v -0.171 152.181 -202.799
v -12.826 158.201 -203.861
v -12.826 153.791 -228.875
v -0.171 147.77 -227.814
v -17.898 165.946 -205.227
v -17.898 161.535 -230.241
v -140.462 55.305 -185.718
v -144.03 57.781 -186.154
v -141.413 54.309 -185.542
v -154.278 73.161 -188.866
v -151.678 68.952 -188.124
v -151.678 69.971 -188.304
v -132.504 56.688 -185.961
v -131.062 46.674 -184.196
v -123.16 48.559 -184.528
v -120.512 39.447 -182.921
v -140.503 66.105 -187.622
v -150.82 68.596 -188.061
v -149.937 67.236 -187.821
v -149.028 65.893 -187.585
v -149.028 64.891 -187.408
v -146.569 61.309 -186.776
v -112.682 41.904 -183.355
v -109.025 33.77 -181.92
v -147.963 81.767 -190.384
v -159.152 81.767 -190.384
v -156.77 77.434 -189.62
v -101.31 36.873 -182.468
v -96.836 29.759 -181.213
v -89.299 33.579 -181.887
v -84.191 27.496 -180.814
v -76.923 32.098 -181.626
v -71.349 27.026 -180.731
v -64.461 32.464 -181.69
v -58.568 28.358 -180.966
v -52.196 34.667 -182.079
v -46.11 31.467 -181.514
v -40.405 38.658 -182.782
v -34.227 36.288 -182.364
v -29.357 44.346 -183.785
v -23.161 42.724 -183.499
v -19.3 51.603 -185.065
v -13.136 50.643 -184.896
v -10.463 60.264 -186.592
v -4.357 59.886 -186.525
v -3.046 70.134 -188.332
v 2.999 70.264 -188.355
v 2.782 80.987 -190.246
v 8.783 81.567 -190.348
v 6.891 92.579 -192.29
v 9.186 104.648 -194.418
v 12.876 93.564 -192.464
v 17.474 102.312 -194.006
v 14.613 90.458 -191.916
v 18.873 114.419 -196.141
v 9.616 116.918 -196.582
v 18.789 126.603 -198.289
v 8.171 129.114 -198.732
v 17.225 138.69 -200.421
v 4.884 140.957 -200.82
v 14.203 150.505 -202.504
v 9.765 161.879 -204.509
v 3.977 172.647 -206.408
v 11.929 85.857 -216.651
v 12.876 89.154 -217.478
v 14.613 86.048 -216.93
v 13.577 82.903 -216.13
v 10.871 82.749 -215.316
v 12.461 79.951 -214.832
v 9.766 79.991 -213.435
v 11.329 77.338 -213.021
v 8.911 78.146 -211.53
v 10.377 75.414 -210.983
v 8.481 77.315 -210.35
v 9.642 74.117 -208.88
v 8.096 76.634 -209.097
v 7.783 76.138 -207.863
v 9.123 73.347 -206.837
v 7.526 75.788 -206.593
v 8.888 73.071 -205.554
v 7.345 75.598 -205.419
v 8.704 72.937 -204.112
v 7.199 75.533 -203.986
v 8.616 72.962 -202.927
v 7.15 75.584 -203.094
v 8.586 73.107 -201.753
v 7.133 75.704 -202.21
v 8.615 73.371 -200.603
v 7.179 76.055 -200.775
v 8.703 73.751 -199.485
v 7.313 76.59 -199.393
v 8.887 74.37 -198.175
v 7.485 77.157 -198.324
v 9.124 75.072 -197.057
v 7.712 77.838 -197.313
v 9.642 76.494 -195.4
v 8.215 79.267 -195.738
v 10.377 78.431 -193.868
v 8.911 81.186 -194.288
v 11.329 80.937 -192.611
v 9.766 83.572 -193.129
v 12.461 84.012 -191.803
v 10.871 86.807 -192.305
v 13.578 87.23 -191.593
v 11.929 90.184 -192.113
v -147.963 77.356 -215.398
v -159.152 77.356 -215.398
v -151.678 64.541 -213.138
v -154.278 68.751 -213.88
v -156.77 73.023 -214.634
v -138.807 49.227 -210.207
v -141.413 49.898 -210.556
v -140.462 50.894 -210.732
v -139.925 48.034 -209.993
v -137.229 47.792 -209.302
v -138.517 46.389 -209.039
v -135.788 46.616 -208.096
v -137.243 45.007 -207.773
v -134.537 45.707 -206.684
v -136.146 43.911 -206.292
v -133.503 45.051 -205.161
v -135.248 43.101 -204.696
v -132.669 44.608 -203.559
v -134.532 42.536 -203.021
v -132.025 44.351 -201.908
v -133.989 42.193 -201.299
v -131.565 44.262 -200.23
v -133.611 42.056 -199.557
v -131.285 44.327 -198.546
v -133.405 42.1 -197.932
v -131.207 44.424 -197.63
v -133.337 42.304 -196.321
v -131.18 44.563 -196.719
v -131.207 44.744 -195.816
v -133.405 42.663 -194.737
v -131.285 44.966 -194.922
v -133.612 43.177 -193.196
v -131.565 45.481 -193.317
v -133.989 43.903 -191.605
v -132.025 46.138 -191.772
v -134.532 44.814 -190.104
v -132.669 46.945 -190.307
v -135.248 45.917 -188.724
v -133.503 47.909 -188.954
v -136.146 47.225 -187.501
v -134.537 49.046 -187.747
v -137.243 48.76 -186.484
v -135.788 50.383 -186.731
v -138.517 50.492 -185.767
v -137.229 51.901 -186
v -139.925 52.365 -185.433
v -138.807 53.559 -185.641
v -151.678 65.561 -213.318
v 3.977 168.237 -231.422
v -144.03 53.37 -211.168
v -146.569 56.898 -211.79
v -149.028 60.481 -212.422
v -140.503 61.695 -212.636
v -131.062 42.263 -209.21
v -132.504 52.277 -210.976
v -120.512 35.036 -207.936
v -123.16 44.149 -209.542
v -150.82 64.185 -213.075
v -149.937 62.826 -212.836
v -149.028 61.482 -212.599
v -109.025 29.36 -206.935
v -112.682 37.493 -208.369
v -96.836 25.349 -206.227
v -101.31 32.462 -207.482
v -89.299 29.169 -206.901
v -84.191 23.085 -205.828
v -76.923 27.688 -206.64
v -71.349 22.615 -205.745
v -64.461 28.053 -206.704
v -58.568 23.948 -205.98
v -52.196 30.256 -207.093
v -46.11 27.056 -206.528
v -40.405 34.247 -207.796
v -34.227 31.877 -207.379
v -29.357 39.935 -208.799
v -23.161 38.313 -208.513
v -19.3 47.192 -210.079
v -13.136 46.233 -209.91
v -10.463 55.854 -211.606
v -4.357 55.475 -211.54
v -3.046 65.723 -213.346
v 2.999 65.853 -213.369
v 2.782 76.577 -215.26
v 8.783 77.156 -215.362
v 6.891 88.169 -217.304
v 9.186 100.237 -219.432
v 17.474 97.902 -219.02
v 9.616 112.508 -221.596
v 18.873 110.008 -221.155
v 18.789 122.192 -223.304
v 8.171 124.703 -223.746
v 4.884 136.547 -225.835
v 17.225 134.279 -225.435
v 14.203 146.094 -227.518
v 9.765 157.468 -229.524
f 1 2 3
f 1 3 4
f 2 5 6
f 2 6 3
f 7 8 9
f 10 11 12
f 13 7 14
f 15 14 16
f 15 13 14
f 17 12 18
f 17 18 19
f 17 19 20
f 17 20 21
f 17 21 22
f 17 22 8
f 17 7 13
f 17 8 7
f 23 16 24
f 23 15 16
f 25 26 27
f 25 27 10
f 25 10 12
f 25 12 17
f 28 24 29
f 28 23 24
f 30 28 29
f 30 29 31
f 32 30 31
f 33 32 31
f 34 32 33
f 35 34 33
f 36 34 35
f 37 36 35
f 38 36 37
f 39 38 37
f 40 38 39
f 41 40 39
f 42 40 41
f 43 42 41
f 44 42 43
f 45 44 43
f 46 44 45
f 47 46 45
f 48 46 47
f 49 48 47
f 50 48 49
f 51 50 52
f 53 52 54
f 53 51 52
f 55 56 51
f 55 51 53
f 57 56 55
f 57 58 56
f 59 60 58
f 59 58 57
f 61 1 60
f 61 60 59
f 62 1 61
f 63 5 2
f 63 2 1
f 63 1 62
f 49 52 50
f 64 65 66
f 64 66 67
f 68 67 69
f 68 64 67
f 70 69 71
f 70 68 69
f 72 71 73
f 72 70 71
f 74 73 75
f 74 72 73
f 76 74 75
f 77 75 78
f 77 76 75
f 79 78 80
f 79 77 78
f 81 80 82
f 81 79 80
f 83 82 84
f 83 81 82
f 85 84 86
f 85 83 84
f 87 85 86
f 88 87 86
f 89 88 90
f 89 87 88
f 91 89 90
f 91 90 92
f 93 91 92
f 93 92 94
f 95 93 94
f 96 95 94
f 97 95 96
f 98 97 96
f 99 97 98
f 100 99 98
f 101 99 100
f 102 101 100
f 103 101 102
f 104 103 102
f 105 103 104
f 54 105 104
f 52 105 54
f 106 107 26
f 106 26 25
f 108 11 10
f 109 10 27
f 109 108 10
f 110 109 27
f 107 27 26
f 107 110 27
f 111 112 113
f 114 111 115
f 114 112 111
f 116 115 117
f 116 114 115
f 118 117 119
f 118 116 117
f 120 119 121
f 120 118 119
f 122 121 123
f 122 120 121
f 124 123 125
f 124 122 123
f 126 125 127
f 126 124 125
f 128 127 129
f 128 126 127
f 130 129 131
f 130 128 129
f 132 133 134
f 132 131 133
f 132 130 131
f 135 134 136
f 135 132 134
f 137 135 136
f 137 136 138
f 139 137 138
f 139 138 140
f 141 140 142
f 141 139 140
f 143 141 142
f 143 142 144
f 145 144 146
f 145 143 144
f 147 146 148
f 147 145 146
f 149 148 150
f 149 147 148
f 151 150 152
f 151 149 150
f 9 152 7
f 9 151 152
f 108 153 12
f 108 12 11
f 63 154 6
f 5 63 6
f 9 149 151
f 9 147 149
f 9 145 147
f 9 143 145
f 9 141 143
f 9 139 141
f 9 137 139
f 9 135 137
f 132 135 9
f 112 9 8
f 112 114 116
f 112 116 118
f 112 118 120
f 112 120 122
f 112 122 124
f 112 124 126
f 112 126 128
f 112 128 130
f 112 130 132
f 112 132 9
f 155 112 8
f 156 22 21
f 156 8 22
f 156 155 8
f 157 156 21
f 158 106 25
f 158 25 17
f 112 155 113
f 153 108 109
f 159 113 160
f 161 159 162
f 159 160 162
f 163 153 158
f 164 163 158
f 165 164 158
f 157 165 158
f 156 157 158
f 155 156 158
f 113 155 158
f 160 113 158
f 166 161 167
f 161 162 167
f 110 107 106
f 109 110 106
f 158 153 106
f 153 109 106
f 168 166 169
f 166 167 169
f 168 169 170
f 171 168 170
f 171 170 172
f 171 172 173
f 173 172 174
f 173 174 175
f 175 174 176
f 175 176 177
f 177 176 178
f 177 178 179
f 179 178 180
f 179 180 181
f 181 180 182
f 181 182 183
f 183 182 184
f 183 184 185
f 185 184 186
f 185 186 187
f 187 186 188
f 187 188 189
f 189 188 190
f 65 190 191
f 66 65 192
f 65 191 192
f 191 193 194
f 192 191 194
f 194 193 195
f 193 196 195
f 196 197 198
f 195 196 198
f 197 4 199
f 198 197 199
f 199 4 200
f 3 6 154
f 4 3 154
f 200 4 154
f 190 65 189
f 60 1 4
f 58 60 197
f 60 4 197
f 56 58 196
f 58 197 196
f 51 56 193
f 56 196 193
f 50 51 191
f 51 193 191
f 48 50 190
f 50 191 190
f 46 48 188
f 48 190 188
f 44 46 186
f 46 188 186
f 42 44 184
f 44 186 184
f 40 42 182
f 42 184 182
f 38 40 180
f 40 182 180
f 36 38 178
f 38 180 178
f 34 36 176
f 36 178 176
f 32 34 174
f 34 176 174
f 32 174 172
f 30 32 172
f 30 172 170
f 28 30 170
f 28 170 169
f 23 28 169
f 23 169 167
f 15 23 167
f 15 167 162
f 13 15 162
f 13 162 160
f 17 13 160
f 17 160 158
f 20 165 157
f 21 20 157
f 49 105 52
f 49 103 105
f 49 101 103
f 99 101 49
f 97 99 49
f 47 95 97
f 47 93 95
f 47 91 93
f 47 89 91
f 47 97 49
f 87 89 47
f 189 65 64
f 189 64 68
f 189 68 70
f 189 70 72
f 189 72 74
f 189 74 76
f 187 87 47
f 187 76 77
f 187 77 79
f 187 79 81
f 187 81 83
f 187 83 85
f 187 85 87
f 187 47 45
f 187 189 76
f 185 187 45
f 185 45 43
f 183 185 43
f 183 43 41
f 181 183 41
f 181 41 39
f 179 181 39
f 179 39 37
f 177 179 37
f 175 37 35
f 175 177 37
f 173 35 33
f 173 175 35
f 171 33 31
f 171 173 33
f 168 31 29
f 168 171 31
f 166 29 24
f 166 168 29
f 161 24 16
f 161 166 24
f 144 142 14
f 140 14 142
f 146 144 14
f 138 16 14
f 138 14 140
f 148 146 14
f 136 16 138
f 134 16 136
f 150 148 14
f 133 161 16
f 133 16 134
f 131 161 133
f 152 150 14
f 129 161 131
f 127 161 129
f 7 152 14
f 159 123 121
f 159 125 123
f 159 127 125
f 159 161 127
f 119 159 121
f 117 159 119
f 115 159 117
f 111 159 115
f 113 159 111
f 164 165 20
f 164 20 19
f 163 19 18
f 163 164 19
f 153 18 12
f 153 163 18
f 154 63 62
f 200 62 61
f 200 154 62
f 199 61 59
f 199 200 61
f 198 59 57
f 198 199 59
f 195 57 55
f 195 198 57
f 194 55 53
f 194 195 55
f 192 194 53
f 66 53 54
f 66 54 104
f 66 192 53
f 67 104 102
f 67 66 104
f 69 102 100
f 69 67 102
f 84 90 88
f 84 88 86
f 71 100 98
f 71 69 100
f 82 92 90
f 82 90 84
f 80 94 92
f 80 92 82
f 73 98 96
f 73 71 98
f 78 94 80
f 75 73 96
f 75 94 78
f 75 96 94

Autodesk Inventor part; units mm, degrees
ref_plane "YZ Plane" through (0, 0, 0) normal (1, 0, 0) x (0, 1, 0)
ref_plane "XZ Plane" through (0, 0, 0) normal (0, 1, 0) x (-1, 0, 0)
ref_plane "Work Plane1" through (27.2016, 137.7902, -207.6153) normal (0, 0, 1) x (1, 0, 0)
ref_plane "Work Plane2" through (-81.5141, 115.844, -101.5145) normal (0, 0, 1) x (1, 0, 0)
sketch "Sketch2" plane through (27.2016, 137.7902, -207.6153) normal (0, 0, 1) x (1, 0, 0)
  line L0 (-50.9279, -141.1381) -> (10.2073, -141.1381)
  point P0 (-27.2016, -137.7902)
ref_plane "Work Plane4" through (-23.7263, -2.2452, -201.3618) normal (0, 0.1736482, 0.9848078) x (1, 0, 0)
ref_plane "Work Plane3" through (-23.7263, -3.3479, -207.6153) normal (0, 0.1736482, 0.9848078) x (1, 0, 0)
sketch "Sketch1" plane through (-81.5141, 95.2083, -218.5455) normal (0, 0.1736482, 0.9848078) x (1, 0, 0)
  line L0 (120.3524, 26.6103) -> (110.8538, 39.0511) projected
  line L1 (109.9403, 39.2699) -> (118.8077, 27.6558) projected
  line L2 (117.4827, 25.3957) -> (118.8077, 27.6558) projected
  line L3 (108.6153, 37.0098) -> (109.9403, 39.2699) projected
  line L4 (-70.1644, -17.8234) -> (-70.1644, -42.3865) projected
  line L5 (-67.5144, -23.0328) -> (-67.5144, -49.6797) projected
  line L6 (-7.2549, -88.8185) -> (-7.2549, -90.7022)
  line L7 (88.6474, -22.0445) -> (90.1001, -24.6815)
  arc A0 (90.1001, -24.6815) -> (85.4909, 74.1551) centre (-2.6058, 20.521) ccw
  line L8 (68.6883, 59.486) -> (92.8567, 47.8109)
  ellipse E0 centre (117.3159, 24.5297) end of major axis (77.6327, 47.7943) minor radius 6.9177 (109.5288, 36.791) -> (89.1504, 46.193) ccw projected
  ellipse E1 centre (118.6409, 26.7898) end of major axis (80.226, 49.3108) minor radius 6.6966 (109.9403, 39.2699) -> (91.8991, 47.566) ccw projected
  line L9 (120.3524, 26.6103) -> (110.8538, 39.0511) projected
  line L10 (120.3524, 26.6103) -> (110.8538, 39.0511) projected
  line L11 (-70.1644, -47.9895) -> (-70.1644, -41.1809) projected
  line L12 (-78.1686, -54.9211) -> (-78.1686, -34.8) projected
  line L13 (-78.1686, -34.8) -> (-78.1686, -33.261) projected
  ellipse E2 centre (-68.1686, -34.8) end of major axis (-78.1686, -34.8) minor radius 8.1116 (-75.6686, -29.4347) -> (-78.1686, -34.8) ccw projected
  line L14 (-78.1686, -54.9211) -> (-78.1686, -34.8) projected
  line L15 (-77.6379, -18.1276) -> (-66.4488, -18.1276)
  line L16 (-66.4488, -18.1276) -> (-58.9889, -34.0305)
  arc A1 (-77.6379, -18.1276) -> (-51.8229, -55.9602) centre (98.8915, 74.6035) ccw
  line L17 (-51.8229, -55.9602) -> (-49.6664, -53.6662)
  ellipse E3 centre (43.7773, 28.2672) end of major axis (9.3333, 77.3077) minor radius 54.627 (86.8491, 61.886) -> (73.2137, 75.1203) ccw projected
  ellipse E4 centre (87.3016, 57.9812) end of major axis (48.0133, 78.9413) minor radius 0.2829 (58.2062, 73.2871) -> (75.8706, 63.7724) ccw projected
  ellipse E5 centre (86.0543, 55.6432) end of major axis (46.766, 76.6033) minor radius 0.2829 (56.9589, 70.9491) -> (74.6233, 61.4344) ccw projected
  ellipse E6 centre (-82.1686, -42.8548) end of major axis (-78.1686, -42.8548) minor radius 0.6946 (-78.1686, -42.8548) -> (-82.1686, -42.1602) ccw projected
  line L18 (85.4909, 74.1551) -> (63.6157, 67.3502)
  arc A2 (-66.1246, -22.0445) -> (76.0856, 61.886) centre (8.3655, 14.1852) ccw
  arc A3 (-70.1644, -30.1049) -> (79.8851, 69.6106) centre (7.0855, 16.4044) ccw
  line L19 (63.6157, 67.3502) -> (68.6883, 59.486)
  point P0 (81.5141, -131.7119)
  point P1 (-70.1644, -31.1405)
  point P2 (97.5203, 45.2683)
  point P3 (-67.5144, -35.2635)
  point P4 (96.3482, 45.7746)
  point P5 (98.1827, 42.4146)
  point P6 (110.3672, 38.7108)
  point P7 (-70.1644, -18.1276)
  point P8 (81.3429, 53.3729)
  point P9 (-67.5144, -34.2466)
extrude "Extrusion1" add sketch "Sketch1" along normal blind 25.4 contours E0 A3 E3 L18 A0 | A0 L7 A3 E0 | A3 L4 L15 L16 A2 L8 | L8 L19 L18 E3 A3 | L17 A1 L5 A3 | L4 A1 L15
fillet "Fillet1" radius 12.7 4 edges at (7.8596, 76.6109, -189.4744) (7.8596, 72.2002, -214.4886) (-132.2588, 41.2279, -209.0273) (-132.2588, 45.6386, -184.0132)
properties part number "thigh_strap_03"
